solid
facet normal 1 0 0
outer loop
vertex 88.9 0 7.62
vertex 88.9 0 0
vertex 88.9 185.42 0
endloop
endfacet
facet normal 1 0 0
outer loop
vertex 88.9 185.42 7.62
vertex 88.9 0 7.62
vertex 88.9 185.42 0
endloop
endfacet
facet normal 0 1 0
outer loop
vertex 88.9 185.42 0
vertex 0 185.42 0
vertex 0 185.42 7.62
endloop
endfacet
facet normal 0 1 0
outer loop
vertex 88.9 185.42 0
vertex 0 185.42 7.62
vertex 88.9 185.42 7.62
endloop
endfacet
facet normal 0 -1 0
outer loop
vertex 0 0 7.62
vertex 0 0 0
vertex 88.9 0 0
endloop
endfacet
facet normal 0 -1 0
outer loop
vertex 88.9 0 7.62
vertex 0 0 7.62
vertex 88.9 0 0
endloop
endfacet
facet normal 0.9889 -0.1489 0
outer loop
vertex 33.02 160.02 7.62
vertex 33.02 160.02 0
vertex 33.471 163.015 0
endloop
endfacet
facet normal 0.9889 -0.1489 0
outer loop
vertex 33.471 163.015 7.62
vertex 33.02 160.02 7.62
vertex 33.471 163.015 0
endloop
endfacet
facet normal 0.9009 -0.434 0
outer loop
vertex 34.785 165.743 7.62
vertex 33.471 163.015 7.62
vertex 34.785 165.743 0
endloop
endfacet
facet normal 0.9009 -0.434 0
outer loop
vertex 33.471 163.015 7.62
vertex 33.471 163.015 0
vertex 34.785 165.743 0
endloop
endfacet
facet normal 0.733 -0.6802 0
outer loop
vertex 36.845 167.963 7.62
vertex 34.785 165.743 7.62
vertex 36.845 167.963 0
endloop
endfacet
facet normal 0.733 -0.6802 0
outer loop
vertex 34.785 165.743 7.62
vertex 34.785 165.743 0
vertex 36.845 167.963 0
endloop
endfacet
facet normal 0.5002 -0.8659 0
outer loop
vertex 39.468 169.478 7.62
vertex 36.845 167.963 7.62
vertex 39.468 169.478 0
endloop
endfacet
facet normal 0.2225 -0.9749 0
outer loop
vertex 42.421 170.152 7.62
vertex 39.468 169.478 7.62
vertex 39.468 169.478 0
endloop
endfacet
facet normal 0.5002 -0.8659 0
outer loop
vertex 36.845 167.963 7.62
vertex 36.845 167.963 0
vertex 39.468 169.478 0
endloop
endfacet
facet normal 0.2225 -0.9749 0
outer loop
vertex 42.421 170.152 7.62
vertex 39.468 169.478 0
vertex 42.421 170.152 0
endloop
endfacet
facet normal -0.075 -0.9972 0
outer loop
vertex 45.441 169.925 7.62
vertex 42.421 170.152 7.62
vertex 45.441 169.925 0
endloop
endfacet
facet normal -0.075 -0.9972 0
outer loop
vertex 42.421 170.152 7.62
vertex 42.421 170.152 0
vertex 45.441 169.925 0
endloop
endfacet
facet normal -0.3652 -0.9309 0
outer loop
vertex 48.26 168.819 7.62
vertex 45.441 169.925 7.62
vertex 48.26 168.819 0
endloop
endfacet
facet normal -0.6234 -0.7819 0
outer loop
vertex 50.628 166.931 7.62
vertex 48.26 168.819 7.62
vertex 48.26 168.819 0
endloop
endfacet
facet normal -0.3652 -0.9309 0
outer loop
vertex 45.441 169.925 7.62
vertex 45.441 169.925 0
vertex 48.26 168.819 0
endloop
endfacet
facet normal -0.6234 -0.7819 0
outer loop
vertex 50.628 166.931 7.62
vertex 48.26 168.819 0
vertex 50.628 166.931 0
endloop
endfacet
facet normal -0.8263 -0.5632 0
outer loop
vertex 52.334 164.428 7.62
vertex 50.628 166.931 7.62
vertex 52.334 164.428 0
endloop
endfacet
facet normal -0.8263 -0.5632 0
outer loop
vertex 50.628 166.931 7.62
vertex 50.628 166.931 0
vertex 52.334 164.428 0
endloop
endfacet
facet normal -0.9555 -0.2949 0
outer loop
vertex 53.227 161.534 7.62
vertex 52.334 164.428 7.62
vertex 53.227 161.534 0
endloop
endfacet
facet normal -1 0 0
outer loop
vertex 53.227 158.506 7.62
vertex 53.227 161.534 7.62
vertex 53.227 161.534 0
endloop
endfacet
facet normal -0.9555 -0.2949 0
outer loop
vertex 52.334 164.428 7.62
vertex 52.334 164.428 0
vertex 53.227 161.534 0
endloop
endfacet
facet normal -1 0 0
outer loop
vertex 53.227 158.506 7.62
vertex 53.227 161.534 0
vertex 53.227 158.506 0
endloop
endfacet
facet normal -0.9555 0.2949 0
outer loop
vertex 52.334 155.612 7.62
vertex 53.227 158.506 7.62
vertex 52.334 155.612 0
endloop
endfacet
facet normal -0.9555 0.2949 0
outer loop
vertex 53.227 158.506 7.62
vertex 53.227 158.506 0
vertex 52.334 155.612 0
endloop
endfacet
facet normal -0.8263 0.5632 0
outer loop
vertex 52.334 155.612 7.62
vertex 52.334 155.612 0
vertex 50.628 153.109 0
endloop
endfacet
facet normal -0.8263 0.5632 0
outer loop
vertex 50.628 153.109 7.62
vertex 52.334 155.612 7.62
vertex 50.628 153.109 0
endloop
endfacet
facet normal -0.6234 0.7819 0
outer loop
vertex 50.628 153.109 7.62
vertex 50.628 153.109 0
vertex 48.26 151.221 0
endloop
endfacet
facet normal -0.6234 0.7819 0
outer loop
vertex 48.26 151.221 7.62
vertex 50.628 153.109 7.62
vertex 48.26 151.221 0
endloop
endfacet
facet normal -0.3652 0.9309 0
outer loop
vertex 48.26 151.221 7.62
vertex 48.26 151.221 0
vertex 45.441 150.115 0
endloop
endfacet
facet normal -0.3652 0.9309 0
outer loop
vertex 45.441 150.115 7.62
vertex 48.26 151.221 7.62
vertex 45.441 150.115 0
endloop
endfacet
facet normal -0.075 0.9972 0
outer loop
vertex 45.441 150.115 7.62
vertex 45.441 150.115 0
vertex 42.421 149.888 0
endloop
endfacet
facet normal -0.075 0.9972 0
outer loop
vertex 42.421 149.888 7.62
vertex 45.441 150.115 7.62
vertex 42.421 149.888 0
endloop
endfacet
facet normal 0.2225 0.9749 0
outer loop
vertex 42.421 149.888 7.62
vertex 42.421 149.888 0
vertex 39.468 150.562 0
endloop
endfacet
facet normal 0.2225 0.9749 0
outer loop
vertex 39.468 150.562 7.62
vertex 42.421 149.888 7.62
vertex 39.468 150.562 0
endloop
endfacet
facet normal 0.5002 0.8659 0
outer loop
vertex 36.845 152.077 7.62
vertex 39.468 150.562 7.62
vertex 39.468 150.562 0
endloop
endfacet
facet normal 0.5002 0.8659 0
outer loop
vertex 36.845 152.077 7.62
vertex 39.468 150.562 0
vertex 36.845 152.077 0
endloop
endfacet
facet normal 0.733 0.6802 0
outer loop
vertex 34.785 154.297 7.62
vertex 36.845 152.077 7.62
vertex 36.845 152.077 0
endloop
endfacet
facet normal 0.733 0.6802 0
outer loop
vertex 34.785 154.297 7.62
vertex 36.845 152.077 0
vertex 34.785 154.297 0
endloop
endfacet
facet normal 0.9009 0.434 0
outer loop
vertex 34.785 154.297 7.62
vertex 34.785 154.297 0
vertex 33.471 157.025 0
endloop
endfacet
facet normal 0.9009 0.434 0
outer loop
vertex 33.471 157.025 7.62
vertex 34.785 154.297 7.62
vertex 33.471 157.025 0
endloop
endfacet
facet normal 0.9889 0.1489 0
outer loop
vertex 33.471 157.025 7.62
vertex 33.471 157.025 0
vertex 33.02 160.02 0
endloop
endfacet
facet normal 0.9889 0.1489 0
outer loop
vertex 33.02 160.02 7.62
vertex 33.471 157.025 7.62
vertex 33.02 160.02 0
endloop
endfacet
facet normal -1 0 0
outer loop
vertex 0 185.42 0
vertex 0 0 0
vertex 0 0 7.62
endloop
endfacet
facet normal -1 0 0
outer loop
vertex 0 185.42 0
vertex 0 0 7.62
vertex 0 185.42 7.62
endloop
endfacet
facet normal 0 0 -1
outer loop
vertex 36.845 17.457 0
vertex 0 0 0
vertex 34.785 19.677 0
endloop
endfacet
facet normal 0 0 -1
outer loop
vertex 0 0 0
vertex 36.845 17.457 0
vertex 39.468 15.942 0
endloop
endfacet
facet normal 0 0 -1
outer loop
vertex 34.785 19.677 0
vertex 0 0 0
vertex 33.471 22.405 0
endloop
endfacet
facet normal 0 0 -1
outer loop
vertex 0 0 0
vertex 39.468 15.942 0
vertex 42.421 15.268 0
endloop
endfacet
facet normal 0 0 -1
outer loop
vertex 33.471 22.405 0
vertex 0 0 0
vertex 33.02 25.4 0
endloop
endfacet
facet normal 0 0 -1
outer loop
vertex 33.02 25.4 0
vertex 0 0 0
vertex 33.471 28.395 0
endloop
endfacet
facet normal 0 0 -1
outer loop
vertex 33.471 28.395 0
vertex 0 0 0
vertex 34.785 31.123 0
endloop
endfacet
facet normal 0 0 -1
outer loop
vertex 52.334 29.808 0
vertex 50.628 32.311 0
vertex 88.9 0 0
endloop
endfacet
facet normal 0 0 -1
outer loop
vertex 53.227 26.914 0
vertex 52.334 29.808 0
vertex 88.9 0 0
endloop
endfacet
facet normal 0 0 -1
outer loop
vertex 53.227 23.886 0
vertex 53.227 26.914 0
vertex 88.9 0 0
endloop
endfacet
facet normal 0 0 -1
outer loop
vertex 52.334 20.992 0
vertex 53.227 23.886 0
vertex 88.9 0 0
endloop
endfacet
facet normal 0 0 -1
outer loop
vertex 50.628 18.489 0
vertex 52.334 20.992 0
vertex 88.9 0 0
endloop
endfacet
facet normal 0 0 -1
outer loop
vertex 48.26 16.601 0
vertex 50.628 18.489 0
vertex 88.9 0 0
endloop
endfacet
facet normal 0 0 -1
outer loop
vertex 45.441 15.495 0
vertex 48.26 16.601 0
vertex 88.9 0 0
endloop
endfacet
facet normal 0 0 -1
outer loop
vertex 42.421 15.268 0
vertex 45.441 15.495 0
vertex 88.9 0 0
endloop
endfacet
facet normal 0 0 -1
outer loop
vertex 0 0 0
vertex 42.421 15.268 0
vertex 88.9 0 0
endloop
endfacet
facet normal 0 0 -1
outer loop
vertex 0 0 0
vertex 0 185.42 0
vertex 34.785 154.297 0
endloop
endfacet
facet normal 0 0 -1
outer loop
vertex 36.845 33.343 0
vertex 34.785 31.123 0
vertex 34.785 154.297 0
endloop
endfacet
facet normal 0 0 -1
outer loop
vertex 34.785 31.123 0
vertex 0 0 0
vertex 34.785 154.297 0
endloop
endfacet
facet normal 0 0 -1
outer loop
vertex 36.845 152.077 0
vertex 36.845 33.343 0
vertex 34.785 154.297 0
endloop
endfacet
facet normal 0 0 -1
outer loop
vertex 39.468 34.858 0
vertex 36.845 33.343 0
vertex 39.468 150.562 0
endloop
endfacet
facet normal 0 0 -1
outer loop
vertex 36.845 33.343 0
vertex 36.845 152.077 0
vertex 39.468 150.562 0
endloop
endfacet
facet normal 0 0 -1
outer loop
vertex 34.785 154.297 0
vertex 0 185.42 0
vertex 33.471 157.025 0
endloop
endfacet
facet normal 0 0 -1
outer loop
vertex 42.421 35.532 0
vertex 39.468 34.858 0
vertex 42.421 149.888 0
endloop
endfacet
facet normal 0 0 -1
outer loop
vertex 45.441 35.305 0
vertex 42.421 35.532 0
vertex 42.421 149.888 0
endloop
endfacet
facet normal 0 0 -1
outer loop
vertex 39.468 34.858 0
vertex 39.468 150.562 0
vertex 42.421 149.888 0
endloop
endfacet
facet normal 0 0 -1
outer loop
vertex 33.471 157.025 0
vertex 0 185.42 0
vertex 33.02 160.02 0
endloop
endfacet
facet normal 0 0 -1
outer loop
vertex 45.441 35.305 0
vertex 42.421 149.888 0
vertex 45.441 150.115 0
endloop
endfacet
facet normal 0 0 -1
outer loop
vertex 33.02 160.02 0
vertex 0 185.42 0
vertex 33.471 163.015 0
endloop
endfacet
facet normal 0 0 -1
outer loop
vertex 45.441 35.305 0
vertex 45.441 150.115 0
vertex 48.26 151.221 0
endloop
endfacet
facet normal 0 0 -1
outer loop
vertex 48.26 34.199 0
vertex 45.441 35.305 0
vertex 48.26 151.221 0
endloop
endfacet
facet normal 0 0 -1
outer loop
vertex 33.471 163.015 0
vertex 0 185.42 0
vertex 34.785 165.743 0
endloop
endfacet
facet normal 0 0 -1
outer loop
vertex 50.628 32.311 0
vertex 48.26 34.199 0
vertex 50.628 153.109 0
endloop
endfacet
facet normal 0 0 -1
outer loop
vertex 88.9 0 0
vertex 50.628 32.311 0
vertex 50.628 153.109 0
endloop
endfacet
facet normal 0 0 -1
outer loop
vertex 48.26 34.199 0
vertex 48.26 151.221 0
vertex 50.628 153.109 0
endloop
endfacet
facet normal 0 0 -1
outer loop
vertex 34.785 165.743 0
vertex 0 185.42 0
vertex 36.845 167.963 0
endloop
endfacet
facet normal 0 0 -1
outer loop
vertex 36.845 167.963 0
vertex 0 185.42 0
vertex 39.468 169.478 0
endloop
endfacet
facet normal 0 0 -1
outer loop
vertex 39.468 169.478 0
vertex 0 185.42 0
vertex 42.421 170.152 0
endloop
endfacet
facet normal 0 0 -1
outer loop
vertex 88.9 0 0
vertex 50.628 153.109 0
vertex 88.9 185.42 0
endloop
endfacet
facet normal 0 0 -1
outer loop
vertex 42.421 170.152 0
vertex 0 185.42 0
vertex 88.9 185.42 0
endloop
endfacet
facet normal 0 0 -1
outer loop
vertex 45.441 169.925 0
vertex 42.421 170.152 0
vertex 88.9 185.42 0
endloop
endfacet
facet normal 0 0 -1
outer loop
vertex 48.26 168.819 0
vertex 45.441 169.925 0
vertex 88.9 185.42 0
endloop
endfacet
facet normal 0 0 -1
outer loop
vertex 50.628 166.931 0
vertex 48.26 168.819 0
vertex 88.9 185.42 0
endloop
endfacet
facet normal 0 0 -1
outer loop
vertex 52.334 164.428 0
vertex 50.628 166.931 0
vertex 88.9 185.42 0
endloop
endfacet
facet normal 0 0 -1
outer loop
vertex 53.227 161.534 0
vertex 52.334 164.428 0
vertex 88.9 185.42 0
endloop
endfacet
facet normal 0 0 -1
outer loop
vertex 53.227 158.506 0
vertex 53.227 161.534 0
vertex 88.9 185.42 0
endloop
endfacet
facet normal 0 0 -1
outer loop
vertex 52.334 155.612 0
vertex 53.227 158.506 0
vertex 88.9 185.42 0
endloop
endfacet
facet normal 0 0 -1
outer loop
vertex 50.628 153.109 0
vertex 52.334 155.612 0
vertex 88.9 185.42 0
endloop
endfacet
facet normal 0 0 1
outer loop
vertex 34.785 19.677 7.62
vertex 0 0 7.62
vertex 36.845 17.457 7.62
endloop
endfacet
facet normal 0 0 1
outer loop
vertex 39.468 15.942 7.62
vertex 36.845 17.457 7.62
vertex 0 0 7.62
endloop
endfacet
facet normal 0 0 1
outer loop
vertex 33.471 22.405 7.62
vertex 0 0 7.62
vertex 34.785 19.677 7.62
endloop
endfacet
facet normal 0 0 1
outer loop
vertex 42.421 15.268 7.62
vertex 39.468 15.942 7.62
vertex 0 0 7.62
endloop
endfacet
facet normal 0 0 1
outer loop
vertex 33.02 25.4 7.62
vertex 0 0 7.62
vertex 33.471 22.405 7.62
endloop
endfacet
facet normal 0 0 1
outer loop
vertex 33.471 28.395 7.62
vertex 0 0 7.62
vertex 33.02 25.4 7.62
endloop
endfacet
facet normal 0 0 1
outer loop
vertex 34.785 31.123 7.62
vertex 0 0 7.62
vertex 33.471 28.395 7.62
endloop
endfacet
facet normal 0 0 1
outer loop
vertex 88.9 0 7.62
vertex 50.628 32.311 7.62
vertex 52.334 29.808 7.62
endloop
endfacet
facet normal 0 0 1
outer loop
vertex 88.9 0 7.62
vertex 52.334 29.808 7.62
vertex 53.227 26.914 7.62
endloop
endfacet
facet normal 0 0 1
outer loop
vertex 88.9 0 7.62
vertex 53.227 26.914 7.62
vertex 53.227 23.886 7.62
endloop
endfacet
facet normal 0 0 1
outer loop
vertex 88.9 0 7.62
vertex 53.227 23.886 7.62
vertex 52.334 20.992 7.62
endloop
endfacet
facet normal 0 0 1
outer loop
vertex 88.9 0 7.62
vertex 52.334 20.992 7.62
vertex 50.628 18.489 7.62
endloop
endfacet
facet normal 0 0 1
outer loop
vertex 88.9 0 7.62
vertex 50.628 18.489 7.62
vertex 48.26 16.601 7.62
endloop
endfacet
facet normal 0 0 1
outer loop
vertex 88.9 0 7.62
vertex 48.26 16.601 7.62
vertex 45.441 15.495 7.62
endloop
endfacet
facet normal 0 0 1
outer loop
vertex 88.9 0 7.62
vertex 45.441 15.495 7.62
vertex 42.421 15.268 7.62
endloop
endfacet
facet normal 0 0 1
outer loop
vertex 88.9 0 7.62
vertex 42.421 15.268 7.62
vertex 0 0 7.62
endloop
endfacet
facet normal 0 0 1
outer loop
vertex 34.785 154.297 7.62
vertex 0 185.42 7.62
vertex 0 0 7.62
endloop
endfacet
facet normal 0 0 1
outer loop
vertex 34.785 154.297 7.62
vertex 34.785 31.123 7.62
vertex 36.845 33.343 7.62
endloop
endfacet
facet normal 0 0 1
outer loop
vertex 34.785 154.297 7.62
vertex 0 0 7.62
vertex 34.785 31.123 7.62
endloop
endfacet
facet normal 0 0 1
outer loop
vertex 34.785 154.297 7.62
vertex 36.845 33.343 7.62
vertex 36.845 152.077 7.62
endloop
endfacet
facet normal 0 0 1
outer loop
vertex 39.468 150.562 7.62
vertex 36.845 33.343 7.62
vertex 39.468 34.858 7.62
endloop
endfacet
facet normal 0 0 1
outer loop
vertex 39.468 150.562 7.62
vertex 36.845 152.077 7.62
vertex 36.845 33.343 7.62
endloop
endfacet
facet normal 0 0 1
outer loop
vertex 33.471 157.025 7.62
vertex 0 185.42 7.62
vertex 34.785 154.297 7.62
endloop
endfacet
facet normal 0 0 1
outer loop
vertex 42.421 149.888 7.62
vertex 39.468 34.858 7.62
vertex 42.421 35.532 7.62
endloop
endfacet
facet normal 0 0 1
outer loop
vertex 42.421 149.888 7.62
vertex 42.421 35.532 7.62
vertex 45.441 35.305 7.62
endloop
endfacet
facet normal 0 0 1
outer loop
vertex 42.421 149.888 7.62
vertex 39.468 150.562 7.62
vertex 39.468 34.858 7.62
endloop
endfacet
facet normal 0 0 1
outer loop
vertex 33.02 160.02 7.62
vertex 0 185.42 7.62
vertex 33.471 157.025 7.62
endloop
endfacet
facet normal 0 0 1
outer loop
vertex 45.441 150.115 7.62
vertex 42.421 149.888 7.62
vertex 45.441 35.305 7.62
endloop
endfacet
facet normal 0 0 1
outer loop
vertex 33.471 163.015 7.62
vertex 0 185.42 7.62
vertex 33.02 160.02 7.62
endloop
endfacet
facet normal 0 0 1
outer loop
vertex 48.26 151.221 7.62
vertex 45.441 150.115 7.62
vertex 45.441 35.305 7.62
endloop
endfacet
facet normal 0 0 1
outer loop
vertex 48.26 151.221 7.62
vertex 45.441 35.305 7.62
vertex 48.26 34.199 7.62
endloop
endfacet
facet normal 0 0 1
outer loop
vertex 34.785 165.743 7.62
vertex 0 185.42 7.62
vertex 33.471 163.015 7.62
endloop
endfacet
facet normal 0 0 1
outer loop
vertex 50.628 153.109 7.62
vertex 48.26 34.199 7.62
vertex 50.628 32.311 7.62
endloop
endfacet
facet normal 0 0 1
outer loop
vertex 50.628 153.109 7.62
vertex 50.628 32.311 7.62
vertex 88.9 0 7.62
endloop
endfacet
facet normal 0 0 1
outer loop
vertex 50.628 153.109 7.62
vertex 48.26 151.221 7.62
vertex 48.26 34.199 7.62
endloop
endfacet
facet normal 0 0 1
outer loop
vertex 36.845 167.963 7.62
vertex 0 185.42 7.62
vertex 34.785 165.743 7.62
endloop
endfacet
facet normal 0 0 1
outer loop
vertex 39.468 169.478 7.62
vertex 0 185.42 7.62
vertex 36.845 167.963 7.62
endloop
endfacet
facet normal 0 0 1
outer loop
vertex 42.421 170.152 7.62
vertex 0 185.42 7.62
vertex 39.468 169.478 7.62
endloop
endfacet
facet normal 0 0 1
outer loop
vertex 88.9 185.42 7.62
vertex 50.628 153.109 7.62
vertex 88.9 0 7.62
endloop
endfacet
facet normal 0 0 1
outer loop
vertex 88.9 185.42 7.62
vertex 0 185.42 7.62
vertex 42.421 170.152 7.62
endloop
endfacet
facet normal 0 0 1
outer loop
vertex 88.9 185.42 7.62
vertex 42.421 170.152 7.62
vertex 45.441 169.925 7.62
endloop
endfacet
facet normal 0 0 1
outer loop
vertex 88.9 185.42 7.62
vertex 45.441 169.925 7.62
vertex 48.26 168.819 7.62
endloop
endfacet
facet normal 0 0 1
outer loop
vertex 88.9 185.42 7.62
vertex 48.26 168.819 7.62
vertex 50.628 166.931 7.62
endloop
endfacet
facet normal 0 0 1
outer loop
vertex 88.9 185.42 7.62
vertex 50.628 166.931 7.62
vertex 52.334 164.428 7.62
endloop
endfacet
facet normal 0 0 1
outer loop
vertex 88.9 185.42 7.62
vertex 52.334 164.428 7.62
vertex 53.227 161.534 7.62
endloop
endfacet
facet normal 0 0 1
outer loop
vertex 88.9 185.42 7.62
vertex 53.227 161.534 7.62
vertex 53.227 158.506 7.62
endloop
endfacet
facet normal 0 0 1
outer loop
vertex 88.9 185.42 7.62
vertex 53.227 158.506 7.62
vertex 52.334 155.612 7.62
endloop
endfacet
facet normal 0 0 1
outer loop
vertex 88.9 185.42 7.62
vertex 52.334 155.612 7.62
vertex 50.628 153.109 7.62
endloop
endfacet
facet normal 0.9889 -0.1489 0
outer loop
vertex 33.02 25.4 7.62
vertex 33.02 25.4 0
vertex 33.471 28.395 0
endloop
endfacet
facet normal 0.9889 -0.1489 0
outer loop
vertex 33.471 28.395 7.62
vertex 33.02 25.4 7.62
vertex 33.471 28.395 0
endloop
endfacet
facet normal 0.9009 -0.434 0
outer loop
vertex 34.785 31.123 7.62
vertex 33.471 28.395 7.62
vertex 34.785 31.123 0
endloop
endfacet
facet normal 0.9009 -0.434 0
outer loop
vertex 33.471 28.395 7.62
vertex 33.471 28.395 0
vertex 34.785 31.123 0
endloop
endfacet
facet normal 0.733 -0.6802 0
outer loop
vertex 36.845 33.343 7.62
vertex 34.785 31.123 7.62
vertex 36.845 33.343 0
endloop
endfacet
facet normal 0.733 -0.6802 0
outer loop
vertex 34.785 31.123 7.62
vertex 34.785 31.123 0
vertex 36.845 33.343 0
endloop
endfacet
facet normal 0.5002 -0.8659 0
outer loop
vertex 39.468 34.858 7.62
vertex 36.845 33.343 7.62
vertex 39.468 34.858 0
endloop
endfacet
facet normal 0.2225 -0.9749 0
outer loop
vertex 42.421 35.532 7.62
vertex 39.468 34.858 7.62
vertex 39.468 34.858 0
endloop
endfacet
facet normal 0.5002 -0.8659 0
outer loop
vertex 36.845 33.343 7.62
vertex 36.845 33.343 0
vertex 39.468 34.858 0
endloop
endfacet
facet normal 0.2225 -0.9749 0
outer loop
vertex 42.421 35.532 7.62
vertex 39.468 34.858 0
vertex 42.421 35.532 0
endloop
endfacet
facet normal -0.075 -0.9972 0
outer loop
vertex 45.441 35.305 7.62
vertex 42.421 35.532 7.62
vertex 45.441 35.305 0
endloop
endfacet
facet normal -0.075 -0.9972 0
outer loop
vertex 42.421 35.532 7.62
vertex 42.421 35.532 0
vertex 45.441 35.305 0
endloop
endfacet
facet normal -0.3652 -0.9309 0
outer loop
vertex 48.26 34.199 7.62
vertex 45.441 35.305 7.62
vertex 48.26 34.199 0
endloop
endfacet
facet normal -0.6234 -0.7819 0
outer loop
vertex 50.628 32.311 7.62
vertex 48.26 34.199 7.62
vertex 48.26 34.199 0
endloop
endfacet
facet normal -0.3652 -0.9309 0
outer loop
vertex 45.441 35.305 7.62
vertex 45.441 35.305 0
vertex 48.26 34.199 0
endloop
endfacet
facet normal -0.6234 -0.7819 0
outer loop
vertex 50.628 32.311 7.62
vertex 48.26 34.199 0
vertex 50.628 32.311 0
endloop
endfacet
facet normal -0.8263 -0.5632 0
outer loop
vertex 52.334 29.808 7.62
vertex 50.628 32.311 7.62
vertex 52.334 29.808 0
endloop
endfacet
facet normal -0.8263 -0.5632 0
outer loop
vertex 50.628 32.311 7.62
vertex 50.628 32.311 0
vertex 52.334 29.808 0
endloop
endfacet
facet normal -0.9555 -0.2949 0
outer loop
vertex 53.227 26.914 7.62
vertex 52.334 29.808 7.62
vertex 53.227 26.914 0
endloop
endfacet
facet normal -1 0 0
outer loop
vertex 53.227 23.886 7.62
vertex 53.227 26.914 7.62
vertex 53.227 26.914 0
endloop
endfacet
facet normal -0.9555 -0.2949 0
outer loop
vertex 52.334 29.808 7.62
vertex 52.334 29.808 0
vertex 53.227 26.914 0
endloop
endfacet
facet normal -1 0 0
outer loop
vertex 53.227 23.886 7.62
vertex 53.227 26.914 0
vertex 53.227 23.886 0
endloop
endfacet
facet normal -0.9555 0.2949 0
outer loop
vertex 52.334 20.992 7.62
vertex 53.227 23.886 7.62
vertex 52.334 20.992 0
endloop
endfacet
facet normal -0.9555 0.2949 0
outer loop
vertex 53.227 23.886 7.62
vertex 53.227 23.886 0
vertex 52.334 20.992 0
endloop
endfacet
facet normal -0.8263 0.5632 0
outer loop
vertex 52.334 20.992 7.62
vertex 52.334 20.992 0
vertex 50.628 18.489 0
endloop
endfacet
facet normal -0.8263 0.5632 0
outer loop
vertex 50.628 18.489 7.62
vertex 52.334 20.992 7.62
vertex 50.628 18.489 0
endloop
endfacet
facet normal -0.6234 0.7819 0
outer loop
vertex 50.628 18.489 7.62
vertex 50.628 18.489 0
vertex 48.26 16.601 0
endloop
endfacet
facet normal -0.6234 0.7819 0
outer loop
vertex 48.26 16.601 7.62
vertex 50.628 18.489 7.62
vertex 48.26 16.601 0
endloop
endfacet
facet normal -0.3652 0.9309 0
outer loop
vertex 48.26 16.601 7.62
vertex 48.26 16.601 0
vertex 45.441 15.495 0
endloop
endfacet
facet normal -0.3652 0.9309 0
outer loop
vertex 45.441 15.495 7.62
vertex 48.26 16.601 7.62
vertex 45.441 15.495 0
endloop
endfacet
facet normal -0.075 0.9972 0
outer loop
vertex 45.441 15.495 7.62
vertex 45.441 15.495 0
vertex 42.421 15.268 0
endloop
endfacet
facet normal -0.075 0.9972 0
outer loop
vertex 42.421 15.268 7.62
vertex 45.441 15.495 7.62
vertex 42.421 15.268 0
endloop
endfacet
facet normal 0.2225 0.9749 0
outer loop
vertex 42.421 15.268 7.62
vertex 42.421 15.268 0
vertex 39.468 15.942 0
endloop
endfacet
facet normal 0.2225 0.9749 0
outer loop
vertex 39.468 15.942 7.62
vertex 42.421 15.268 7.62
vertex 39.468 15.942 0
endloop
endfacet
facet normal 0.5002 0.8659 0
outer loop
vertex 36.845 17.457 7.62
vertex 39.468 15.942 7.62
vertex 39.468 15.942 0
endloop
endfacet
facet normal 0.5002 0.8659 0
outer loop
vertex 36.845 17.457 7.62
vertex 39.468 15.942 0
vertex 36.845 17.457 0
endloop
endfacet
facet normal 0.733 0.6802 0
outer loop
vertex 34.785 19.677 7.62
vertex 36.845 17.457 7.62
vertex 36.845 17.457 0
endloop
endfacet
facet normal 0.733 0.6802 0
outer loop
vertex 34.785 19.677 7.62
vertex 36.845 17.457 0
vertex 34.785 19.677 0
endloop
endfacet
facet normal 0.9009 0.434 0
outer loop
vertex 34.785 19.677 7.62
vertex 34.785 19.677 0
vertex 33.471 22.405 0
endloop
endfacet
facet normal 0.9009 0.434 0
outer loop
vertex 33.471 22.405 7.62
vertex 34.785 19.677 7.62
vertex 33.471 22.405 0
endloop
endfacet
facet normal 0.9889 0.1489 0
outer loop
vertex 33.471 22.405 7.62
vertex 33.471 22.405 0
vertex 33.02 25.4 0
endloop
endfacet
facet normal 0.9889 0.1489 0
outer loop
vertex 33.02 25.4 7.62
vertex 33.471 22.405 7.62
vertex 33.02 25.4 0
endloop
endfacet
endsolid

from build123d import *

# Parameters (mm, degrees)
F0_W     = 88.9
F0_H     = 185.42
F1_DEPTH = 7.62
F3_D     = 20.32


with BuildPart() as f1:
    # F0 (on Top) → F1 (new body)
    with BuildSketch(Plane.XY):
        with Locations((44.45, 92.71)):
            Rectangle(F0_W, F0_H)
    extrude(amount=F1_DEPTH)

    # F3 (through all)
    with Locations(Plane.XY.offset(7.62)):
        with Locations((43.18, 160.02), (43.18, 25.4)):
            Hole(F3_D / 2)


solid = f1.part
